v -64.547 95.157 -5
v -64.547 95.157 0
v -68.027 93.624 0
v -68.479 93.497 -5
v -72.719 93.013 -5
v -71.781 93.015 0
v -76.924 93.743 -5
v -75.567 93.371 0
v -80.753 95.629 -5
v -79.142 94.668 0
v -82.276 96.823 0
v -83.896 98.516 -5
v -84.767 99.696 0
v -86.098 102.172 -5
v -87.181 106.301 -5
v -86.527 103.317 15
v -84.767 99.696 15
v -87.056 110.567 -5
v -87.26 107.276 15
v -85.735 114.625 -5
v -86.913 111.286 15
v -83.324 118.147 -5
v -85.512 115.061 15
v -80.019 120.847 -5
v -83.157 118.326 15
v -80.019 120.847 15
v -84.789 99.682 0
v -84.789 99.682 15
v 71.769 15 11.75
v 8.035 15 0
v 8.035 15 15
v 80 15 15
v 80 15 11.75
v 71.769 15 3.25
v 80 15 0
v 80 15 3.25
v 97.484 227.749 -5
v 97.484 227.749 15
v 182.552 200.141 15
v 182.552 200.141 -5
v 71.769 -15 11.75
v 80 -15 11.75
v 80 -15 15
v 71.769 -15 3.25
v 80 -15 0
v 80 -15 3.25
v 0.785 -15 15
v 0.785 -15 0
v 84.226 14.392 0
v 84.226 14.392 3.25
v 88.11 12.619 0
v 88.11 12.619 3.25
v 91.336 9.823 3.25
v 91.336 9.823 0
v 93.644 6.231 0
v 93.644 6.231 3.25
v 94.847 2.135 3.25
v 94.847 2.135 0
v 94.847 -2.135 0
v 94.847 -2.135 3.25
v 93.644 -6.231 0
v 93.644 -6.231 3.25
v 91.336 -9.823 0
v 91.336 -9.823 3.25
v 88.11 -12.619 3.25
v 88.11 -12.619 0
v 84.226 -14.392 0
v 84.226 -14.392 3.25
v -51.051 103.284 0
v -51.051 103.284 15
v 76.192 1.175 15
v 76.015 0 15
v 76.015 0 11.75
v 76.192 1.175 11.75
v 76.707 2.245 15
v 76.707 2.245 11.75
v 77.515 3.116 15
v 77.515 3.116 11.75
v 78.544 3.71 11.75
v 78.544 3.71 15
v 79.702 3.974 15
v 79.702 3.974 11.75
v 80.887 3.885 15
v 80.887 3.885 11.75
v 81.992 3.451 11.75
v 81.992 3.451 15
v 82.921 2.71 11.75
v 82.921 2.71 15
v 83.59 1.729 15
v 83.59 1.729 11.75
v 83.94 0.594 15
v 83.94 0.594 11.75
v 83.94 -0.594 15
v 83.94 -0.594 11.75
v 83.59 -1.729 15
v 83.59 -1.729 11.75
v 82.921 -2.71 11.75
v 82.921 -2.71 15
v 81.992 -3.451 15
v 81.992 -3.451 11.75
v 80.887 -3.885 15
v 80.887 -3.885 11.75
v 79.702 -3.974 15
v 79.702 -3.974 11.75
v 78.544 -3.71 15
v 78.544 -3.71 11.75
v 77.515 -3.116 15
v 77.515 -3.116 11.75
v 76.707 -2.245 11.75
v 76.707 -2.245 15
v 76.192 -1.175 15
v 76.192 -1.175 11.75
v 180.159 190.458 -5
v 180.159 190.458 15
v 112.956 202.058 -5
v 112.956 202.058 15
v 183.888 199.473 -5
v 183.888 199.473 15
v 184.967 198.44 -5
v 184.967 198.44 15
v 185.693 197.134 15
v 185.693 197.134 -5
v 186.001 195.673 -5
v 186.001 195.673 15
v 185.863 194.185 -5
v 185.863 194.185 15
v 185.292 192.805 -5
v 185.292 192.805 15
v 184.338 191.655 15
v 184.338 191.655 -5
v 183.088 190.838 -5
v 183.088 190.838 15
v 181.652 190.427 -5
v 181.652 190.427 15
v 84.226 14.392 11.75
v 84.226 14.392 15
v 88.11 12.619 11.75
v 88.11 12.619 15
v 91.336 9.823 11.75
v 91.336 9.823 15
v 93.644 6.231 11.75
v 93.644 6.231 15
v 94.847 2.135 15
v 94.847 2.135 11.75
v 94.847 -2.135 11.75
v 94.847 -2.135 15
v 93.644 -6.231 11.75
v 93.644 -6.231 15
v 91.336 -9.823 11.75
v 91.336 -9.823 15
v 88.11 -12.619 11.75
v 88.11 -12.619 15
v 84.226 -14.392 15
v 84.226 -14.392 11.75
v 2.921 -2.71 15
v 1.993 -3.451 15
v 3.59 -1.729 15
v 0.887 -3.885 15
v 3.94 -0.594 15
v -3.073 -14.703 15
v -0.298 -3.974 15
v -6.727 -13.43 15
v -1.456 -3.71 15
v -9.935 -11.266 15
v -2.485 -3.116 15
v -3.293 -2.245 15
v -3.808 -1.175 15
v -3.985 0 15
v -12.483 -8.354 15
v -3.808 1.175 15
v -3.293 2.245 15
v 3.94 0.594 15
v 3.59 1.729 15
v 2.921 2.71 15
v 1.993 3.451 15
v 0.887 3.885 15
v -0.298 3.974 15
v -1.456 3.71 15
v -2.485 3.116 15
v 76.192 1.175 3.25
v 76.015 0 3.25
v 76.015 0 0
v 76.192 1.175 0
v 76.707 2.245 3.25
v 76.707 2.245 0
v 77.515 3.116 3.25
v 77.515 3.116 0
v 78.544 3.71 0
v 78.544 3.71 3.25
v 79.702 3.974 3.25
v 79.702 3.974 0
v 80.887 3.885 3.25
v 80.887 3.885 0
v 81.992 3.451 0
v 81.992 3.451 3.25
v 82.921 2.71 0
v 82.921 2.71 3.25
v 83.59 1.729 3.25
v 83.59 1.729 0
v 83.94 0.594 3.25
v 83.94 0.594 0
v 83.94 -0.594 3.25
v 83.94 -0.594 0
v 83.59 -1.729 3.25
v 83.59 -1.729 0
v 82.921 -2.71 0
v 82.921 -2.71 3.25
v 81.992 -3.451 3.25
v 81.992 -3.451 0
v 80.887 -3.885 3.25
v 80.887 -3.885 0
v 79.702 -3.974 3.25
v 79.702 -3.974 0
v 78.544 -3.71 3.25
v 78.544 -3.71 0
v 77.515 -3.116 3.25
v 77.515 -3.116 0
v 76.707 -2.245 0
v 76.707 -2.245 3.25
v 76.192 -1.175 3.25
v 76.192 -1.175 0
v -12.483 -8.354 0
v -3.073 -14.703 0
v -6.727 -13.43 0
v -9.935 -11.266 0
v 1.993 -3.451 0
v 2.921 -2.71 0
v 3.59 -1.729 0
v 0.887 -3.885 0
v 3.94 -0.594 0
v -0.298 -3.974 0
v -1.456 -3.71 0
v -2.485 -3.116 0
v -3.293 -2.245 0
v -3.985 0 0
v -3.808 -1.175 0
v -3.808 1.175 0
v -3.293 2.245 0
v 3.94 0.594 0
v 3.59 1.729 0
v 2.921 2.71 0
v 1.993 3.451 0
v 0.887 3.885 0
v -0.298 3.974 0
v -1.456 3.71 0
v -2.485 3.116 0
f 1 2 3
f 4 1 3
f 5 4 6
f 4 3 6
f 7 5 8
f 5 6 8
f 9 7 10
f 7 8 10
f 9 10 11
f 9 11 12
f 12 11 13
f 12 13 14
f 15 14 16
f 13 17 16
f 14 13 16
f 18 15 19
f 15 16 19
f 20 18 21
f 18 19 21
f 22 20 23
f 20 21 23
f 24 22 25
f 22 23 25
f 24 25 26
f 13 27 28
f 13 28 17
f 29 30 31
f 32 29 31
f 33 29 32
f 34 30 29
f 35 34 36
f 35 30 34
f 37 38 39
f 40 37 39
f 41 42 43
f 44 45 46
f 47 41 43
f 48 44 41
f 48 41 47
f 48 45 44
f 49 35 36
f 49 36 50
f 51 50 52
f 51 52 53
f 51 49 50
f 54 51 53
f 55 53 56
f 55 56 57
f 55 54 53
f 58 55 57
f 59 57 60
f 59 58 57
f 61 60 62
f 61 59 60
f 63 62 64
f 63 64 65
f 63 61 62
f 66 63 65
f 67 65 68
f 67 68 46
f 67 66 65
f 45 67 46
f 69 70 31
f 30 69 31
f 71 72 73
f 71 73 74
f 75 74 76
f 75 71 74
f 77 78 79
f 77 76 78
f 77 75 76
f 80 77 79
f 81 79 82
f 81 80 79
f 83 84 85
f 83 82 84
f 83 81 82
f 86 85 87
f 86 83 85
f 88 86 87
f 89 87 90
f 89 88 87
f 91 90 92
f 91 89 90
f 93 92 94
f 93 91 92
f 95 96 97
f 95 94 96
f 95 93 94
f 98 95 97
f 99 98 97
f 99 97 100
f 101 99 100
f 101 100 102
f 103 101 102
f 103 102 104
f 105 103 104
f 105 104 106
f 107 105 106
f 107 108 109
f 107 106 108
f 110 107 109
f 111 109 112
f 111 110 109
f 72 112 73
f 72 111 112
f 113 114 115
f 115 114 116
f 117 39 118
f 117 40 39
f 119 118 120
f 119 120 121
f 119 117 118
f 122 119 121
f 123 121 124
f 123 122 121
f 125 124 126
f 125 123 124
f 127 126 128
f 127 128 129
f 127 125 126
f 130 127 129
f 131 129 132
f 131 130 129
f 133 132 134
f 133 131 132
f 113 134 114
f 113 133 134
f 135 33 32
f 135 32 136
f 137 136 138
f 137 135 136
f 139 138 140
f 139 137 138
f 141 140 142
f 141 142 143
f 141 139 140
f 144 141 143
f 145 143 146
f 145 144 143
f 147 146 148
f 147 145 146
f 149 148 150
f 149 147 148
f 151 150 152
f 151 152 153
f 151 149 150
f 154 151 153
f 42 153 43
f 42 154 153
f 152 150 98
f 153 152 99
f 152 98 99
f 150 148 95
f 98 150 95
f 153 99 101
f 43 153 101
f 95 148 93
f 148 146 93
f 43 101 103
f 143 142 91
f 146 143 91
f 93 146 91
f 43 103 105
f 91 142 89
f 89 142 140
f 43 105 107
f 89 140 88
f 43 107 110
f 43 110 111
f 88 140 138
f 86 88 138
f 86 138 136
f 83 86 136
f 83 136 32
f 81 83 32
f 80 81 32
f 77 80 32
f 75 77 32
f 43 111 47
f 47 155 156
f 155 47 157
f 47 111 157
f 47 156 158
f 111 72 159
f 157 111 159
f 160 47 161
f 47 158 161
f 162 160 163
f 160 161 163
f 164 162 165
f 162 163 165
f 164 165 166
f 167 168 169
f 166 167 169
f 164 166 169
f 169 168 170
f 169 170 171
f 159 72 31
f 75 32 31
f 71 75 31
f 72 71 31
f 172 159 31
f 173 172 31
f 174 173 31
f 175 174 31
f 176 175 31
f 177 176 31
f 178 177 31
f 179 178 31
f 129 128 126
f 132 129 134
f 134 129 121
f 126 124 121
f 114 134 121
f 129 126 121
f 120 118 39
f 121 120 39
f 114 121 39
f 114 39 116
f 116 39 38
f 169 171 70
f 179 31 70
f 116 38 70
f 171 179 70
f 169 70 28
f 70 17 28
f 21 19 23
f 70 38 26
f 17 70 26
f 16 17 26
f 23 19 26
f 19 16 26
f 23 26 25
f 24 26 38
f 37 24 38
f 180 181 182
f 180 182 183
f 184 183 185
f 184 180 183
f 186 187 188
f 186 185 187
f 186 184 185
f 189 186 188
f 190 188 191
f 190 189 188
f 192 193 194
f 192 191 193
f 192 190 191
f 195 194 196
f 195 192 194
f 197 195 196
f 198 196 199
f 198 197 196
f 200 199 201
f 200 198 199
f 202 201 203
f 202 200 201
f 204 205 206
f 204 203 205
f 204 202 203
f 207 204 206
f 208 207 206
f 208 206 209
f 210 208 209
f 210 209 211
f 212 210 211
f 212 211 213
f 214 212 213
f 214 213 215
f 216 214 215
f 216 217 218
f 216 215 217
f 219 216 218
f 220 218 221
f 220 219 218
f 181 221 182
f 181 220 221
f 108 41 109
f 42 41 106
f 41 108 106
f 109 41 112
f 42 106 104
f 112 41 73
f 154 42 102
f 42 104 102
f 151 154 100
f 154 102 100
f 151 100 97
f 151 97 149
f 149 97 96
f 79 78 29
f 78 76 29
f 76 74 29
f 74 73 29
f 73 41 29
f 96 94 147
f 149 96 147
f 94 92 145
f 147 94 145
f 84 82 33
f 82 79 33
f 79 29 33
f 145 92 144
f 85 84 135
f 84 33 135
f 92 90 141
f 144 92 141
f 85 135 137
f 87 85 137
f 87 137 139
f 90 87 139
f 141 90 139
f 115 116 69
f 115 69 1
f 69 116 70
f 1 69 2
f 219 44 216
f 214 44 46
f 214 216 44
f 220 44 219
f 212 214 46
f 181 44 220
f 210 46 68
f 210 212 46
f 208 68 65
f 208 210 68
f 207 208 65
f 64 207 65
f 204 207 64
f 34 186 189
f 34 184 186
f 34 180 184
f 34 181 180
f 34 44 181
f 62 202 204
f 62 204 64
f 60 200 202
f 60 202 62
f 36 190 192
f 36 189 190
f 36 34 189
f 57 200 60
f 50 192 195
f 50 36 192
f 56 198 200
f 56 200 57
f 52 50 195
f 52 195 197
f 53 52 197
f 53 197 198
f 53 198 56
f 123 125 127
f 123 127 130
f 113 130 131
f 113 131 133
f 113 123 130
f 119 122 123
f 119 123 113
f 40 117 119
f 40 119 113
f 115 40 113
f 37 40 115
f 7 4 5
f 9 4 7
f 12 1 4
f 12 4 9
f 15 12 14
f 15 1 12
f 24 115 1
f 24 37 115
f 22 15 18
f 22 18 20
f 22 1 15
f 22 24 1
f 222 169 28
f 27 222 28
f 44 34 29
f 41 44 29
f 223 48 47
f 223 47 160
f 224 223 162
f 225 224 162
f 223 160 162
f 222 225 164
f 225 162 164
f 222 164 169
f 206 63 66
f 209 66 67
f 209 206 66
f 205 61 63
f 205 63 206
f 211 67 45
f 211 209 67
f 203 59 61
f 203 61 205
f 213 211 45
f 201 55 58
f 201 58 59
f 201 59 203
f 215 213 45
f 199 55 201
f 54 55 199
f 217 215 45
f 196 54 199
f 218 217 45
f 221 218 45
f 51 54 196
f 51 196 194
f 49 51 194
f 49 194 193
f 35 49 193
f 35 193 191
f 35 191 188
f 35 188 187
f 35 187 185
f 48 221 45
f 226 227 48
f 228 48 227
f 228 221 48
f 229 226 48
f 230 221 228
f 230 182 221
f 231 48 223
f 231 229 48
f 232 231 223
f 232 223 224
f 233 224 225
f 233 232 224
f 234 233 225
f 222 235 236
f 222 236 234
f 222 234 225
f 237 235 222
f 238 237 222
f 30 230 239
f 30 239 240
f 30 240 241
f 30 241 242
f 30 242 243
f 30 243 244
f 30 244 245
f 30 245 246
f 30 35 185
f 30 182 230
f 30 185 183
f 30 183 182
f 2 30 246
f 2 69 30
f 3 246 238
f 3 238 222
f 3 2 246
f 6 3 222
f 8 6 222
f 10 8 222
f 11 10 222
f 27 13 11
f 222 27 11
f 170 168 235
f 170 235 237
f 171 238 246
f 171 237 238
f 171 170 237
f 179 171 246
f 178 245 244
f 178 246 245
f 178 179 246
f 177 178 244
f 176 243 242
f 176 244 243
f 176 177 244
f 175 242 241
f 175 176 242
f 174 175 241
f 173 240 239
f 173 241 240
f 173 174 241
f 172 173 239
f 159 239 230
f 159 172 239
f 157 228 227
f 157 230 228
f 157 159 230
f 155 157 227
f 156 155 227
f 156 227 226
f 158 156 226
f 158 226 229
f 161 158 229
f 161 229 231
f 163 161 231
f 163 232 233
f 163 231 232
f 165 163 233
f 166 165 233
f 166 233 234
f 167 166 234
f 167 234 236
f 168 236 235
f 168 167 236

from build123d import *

# Parameters (mm, degrees)
EXTRUDE_1_DEPTH          = 15
CUT_EXTRUDE_1_DEPTH      = 101.747208398
CUT_EXTRUDE_1_DEPTH_BACK = 101.747208398
SKETCH_2_W               = 23.23079143
SKETCH_2_H               = 8.5
CUT_EXTRUDE_2_DEPTH      = 98.33961167
CUT_EXTRUDE_2_DEPTH_BACK = 98.33961167
SKETCH_3_R               = 3.985
EXTRUDE_2_DEPTH          = 15
CUT_EXTRUDE_4_DEPTH      = 157.182605119
CUT_EXTRUDE_4_DEPTH_BACK = 157.182605119
SKETCH_9_R               = 3.985
CUT_EXTRUDE_5_DEPTH      = 157.182605119
CUT_EXTRUDE_5_DEPTH_BACK = 157.182605119
EXTRUDE_5_DEPTH          = 20
FILLET_1_R               = 5


with BuildPart() as part:
    # 草图1 → 凸台-拉伸1 (new body)
    with BuildSketch(Plane.XY):
        with BuildLine():
            Line((0, 15), (80, 15))
            ThreePointArc((80, 15), (95, 0), (80, -15))
            Line((80, -15), (0, -15))
            ThreePointArc((0, -15), (-15, 0), (0, 15))
        make_face()
    extrude(amount=EXTRUDE_1_DEPTH)

    # 草图2 → 切除-拉伸1 (cut, two sides: drawn at the far end of the back side and taken through both)
    with BuildSketch(Plane.XZ.offset(15).offset(-CUT_EXTRUDE_1_DEPTH_BACK)):
        with Locations((83.384604285, 7.5)):
            Rectangle(SKETCH_2_W, SKETCH_2_H)
    extrude(amount=CUT_EXTRUDE_1_DEPTH + CUT_EXTRUDE_1_DEPTH_BACK, mode=Mode.SUBTRACT)

    # 草图3 → 切除-拉伸2 (cut, two sides: drawn at the far end of the back side and taken through both)
    with BuildSketch(Plane(origin=(0, 0, 0), x_dir=(-1, 0, 0), z_dir=(0, 0, -1)).offset(-CUT_EXTRUDE_2_DEPTH_BACK)):
        with Locations((-80, 0)):
            Circle(SKETCH_3_R)
    extrude(amount=CUT_EXTRUDE_2_DEPTH + CUT_EXTRUDE_2_DEPTH_BACK, mode=Mode.SUBTRACT)

    # 草图4 → 凸台-拉伸2 (add)
    with BuildSketch(Plane.XY.offset(15)):
        with BuildLine():
            Line((-12.482779954, -8.354383615), (-84.788603834, 99.682035397))
            ThreePointArc((-84.788603834, 99.682035397), (-80.660207496, 120.519198965), (-59.823043927, 116.390802627))
            Line((-59.823043927, 116.390802627), (12.482779954, 8.354383615))
            ThreePointArc((12.482779954, 8.354383615), (8.354383615, -12.482779954), (-12.482779954, -8.354383615))
        make_face()
    extrude(amount=-EXTRUDE_2_DEPTH)

    # 草图9 → 切除-拉伸4 (cut, two sides: drawn at the far end of the back side and taken through both)
    with BuildSketch(Plane(origin=(0, 0, 0), x_dir=(-1, 0, 0), z_dir=(0, 0, -1)).offset(-CUT_EXTRUDE_4_DEPTH_BACK)):
        Circle(SKETCH_9_R)
    extrude(amount=CUT_EXTRUDE_4_DEPTH + CUT_EXTRUDE_4_DEPTH_BACK, mode=Mode.SUBTRACT)

    # 草图10 → 切除-拉伸5 (cut, two sides: drawn at the far end of the back side and taken through both)
    with BuildSketch(Plane.XY.offset(15).offset(-CUT_EXTRUDE_5_DEPTH_BACK)):
        Polygon((-84.788603834, 99.682035397), (-48.234850364, 123.999680139), (-59.64356033, 141.14900426), (-100.506345589, 113.964745441), (-89.097635623, 96.815421321), align=None)
    extrude(amount=CUT_EXTRUDE_5_DEPTH + CUT_EXTRUDE_5_DEPTH_BACK, mode=Mode.SUBTRACT)

    # 草图11 → 凸台-拉伸5 (add)
    with BuildSketch(Plane.XY.offset(15)):
        with BuildLine():
            Line((97.484212933, 227.748715927), (249.011128895, 178.572894151))
            Line((249.011128895, 178.572894151), (112.956276539, 202.05846487))
            Line((112.956276539, 202.05846487), (-64.546579612, 95.156610362))
            ThreePointArc((-64.546579612, 95.156610362), (-85.127736943, 100.265704087), (-80.018643218, 120.846861419))
            Line((-80.018643218, 120.846861419), (97.484212933, 227.748715927))
        make_face()
    extrude(amount=-EXTRUDE_5_DEPTH)

    # 圆角1
    fillet_1_edges = [part.edges().sort_by_distance(p)[0] for p in [
        (249.011128895, 178.572894151, 5),
    ]]
    fillet(fillet_1_edges, radius=FILLET_1_R)


solid = part.part
